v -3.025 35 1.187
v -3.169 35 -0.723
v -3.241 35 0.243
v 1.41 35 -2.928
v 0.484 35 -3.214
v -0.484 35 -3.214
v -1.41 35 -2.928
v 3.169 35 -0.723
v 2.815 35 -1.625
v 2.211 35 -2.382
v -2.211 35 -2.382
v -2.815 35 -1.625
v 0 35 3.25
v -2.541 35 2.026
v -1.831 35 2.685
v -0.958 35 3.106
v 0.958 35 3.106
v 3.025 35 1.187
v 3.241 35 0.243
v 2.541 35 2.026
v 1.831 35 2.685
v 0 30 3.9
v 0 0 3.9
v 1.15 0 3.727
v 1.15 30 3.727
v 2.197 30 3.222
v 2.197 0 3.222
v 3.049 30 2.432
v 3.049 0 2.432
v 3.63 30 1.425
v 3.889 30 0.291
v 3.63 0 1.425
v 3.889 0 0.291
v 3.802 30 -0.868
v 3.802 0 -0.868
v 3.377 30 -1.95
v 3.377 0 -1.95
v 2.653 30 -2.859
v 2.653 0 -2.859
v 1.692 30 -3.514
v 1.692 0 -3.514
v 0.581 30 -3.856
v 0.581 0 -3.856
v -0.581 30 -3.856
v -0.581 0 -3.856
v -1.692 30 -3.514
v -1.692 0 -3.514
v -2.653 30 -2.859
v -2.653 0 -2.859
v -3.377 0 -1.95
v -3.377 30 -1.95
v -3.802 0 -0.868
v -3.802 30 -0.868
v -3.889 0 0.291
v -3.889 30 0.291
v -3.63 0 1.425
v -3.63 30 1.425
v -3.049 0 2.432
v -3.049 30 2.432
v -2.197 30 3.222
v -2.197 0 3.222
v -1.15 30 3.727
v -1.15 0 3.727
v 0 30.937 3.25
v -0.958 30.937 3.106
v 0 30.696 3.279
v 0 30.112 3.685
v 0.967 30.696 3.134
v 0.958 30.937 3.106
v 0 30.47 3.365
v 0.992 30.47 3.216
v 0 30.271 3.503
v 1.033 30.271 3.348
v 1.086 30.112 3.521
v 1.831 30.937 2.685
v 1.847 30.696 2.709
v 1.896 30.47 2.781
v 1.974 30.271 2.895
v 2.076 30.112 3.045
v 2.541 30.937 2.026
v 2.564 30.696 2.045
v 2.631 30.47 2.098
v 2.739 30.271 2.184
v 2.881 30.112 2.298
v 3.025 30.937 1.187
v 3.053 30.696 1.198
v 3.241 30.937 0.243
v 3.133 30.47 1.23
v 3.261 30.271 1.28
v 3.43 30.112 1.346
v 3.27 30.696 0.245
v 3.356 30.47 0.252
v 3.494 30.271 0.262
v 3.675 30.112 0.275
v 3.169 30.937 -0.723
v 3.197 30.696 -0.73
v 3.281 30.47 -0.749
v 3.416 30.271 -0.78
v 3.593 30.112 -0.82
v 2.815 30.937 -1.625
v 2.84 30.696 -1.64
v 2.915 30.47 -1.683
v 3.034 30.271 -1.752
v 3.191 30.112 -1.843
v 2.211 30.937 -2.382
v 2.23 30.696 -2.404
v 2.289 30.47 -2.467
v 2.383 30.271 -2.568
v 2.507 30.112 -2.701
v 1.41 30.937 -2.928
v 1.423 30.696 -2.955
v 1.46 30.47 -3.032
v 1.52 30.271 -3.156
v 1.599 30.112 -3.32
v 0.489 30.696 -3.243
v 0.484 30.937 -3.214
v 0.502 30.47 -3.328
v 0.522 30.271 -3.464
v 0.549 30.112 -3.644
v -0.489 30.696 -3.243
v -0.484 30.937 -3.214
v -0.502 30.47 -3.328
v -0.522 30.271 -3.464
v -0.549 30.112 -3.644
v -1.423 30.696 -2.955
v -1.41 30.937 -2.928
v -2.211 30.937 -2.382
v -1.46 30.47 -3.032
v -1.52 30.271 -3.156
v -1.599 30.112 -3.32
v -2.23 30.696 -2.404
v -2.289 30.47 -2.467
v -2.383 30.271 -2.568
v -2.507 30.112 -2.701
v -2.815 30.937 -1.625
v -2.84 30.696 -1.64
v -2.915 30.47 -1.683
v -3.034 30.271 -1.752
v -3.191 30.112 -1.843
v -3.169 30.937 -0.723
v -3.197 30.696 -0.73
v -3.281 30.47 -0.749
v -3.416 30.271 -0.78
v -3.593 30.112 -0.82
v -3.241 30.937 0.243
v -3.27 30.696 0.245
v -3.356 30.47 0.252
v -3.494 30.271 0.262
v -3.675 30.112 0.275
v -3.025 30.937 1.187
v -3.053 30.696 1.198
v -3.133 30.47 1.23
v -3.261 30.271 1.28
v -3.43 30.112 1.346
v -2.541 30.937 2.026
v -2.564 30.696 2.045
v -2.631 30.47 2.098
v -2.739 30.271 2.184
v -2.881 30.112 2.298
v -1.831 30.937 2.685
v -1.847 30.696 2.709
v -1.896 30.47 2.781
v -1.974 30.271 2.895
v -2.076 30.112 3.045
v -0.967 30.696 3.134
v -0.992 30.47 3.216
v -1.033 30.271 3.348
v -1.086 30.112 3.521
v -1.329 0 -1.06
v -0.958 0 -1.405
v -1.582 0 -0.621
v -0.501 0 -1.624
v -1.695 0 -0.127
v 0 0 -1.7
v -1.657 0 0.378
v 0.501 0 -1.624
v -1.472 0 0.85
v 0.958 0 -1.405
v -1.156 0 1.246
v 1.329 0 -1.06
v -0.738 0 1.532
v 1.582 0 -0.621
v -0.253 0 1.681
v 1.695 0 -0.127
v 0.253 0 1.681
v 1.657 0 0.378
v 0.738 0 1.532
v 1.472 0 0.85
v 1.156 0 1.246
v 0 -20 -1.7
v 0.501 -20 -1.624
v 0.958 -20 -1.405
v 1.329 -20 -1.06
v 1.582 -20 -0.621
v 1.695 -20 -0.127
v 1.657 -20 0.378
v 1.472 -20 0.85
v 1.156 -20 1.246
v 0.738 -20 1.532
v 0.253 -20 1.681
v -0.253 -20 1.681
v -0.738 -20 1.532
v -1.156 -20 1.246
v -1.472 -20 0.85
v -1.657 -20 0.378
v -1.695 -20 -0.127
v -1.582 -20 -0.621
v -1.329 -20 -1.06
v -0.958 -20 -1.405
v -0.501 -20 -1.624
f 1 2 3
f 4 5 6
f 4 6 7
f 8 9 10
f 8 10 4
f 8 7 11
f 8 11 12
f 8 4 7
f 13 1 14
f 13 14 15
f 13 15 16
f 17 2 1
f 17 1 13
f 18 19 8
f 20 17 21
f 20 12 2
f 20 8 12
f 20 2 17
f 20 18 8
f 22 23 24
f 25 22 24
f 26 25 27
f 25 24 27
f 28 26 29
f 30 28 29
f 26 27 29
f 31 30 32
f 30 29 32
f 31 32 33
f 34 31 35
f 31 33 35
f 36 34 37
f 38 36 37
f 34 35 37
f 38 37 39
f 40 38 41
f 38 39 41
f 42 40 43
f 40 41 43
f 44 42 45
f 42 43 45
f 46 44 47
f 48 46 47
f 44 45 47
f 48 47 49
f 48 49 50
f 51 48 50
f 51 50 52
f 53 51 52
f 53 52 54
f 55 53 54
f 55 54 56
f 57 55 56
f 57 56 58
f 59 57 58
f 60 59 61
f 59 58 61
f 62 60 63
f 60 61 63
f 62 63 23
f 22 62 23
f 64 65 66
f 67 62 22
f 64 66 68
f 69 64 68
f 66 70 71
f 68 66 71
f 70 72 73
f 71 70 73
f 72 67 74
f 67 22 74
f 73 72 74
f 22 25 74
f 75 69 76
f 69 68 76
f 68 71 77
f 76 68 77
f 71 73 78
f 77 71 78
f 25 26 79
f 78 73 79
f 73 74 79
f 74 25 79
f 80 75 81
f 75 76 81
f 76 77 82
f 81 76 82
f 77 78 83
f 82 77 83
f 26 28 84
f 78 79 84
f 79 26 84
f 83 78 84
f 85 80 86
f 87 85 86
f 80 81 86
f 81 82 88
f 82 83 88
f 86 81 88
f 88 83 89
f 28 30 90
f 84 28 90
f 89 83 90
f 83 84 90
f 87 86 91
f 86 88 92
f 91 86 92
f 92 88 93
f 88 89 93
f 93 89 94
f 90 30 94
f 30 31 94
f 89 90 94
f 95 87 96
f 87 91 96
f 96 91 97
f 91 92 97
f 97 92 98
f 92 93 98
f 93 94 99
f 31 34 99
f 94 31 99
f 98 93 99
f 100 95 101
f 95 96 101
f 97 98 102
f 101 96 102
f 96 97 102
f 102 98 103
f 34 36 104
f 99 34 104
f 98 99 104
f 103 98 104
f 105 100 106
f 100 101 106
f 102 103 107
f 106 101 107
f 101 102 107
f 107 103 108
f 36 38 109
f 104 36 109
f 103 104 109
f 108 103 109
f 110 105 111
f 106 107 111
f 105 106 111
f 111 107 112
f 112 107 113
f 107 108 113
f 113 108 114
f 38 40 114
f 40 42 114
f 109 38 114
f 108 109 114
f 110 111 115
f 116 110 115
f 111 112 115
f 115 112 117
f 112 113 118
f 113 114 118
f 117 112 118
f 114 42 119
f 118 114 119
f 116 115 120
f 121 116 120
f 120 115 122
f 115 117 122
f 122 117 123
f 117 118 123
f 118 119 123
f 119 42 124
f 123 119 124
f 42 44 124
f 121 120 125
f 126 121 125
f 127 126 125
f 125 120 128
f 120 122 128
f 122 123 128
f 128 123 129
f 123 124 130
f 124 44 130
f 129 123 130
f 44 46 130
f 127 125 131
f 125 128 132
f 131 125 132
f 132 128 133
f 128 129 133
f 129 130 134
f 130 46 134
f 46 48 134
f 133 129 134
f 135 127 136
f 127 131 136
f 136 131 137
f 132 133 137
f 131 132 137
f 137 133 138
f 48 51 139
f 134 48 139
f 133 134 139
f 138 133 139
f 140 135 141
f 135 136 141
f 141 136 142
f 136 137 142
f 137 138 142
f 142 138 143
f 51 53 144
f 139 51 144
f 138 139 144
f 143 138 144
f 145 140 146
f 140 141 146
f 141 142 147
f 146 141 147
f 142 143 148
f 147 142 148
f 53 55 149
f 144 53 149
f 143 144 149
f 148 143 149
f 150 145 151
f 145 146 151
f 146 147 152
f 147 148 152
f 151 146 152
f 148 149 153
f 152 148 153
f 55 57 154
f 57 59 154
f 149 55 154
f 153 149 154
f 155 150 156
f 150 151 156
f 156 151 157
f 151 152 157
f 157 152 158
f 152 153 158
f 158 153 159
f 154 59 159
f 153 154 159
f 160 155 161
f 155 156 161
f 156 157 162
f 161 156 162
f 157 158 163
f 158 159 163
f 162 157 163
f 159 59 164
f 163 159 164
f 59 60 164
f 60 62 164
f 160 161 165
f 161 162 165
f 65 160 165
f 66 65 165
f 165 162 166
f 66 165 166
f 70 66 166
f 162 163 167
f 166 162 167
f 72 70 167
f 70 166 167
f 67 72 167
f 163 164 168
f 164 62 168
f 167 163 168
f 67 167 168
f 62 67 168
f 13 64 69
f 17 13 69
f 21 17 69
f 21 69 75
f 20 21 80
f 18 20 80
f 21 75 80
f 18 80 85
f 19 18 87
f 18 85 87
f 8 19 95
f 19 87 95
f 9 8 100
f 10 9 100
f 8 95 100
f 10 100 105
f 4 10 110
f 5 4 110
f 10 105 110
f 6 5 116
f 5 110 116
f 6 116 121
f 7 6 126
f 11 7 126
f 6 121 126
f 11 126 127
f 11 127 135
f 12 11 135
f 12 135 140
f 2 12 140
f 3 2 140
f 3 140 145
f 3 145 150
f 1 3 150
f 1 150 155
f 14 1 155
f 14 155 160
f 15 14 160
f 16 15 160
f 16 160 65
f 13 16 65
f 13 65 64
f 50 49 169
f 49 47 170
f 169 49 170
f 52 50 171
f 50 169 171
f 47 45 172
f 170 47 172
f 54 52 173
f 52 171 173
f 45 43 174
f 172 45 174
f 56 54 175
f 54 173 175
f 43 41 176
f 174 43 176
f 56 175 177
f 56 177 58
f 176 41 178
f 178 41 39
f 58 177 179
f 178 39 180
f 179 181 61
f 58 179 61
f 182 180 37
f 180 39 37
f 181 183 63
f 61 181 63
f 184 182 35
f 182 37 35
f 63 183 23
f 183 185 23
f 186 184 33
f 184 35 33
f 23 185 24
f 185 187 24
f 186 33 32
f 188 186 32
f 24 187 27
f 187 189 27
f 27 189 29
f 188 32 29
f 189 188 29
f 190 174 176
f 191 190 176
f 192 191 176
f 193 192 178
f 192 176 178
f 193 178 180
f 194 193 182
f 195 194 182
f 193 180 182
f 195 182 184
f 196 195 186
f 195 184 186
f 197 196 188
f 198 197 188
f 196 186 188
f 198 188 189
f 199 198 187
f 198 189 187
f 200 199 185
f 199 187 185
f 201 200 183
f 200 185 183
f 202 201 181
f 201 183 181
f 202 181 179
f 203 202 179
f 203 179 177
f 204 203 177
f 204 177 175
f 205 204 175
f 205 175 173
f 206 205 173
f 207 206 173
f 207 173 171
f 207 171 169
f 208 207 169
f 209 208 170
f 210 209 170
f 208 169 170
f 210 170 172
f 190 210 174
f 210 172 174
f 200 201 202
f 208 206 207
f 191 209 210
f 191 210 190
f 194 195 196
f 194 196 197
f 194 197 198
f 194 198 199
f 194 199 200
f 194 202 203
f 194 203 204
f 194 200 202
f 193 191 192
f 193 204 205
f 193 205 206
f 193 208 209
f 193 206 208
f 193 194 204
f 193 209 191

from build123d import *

# Parameters (mm, degrees)
CROQUIS1_R              = 3.9
SALIENTE_EXTRUIR1_DEPTH = 30
CROQUIS2_R              = 3.25
SALIENTE_EXTRUIR2_DEPTH = 5
CROQUIS3_R              = 1.7
SALIENTE_EXTRUIR3_DEPTH = 20
REDONDEO1_R             = 1


with BuildPart() as part:
    # Croquis1 → Saliente-Extruir1 (new body)
    with BuildSketch(Plane(origin=(0, 0, 0), x_dir=(1, 0, 0), z_dir=(0, 1, 0))):
        with Locations(Location((0, 0, 0), (0, 0, 270))):
            Circle(CROQUIS1_R)
    extrude(amount=SALIENTE_EXTRUIR1_DEPTH)

    # Croquis2 → Saliente-Extruir2 (add)
    with BuildSketch(Plane(origin=(0, 30, 0), x_dir=(1, 0, 0), z_dir=(0, 1, 0))):
        with Locations(Location((0, 0, 0), (0, 0, 270))):
            Circle(CROQUIS2_R)
    extrude(amount=SALIENTE_EXTRUIR2_DEPTH)

    # Croquis3 → Saliente-Extruir3 (add)
    with BuildSketch(Plane.XZ):
        with Locations(Location((0, 0, 0), (0, 0, 270))):
            Circle(CROQUIS3_R)
    extrude(amount=SALIENTE_EXTRUIR3_DEPTH)

    # Redondeo1
    # the kernel refuses this fillet: 1 mm, written as the material it adds along each edge
    with BuildSketch(Plane(origin=(0, 30, 0), x_dir=(0, 0, 1), z_dir=(-1, 0, 0))) as redondeo1_piece_1:
        with BuildLine():
            CenterArc((4.25, 0.9367497), REDONDEO1_R, 180, 69.512684885)
            Line((3.25, 0.9367497), (3.23, 0.9367497))
            Line((3.23, 0.9367497), (3.23, 0))
            Line((3.23, 0), (3.25, -0.02))
            ThreePointArc((3.25, -0.02), (3.575, -0.02), (3.893, -0.018734994))
            Line((3.893, -0.018734994), (3.9, 0))
        make_face()
    revolve(axis=Axis((0, 30, 0), (0, 1, 0)))


solid = part.part
